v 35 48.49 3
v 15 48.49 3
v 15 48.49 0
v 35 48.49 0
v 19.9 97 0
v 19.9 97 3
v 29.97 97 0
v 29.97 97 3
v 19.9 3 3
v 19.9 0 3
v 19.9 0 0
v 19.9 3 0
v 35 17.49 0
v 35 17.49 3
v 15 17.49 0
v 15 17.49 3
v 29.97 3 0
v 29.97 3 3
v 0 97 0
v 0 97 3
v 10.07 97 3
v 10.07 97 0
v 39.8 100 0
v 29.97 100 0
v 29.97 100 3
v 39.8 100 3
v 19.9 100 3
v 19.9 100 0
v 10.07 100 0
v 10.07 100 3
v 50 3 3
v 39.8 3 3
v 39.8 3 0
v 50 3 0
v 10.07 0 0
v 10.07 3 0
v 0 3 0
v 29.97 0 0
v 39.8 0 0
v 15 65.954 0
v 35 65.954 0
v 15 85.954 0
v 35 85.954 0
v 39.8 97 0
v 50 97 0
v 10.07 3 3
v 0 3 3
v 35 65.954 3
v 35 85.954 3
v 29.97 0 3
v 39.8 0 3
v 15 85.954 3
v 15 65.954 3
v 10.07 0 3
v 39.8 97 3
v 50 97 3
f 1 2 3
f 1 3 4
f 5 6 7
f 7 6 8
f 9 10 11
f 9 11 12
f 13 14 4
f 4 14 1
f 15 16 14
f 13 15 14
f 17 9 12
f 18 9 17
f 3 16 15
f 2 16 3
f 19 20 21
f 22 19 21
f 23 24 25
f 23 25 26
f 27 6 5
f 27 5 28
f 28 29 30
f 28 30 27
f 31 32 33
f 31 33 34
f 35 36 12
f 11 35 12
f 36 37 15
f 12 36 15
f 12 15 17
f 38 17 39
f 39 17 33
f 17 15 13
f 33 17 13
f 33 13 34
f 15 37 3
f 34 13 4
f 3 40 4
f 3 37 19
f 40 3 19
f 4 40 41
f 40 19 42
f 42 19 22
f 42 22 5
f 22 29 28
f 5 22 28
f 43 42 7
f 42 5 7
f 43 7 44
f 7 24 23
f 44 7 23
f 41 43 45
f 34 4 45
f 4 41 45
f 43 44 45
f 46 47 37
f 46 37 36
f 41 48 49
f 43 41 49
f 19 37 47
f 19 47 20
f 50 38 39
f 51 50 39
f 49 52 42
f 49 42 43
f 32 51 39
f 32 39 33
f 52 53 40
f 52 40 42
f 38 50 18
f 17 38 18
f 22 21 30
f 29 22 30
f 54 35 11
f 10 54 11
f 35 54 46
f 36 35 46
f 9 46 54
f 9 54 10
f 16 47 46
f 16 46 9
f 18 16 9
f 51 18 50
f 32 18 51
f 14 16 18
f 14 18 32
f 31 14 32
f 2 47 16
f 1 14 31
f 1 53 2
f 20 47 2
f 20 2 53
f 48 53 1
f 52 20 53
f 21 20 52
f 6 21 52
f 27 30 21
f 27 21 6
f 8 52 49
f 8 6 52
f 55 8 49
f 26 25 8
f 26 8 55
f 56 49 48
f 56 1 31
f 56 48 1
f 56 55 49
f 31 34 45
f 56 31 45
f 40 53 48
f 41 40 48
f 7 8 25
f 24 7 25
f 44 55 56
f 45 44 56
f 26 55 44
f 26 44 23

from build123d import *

# Parameters (mm, degrees)
ESQUISSE1_W             = 50
ESQUISSE1_H             = 100
BOSS_EXTRU_1_DEPTH      = 3
ESQUISSE3_W             = 20
ESQUISSE3_H             = 20
ESQUISSE3_H_2           = 31
ENL_V_MAT_EXTRU_2_DEPTH = 3
ESQUISSE5_W             = 10.07
ESQUISSE5_H             = 3
ENL_V_MAT_EXTRU_3_DEPTH = 3
ESQUISSE6_W             = 0.13
ESQUISSE6_H             = 3
ENL_V_MAT_EXTRU_4_DEPTH = 3


with BuildPart() as part:
    # Esquisse1 → Boss.-Extru.1 (new body)
    with BuildSketch(Plane.XY):
        with Locations((25, 50)):
            Rectangle(ESQUISSE1_W, ESQUISSE1_H)
    extrude(amount=BOSS_EXTRU_1_DEPTH)

    # Esquisse3 → Enlèv. mat.-Extru.2 (cut)
    with BuildSketch(Plane.XY.offset(3)):
        with Locations((25, 75.953744756)):
            Rectangle(ESQUISSE3_W, ESQUISSE3_H)
        with Locations((25, 32.989712488)):
            Rectangle(ESQUISSE3_W, ESQUISSE3_H_2)
    extrude(amount=-ENL_V_MAT_EXTRU_2_DEPTH, mode=Mode.SUBTRACT)

    # Esquisse5 → Enlèv. mat.-Extru.3 (cut)
    with BuildSketch(Plane.XY.offset(3)):
        with Locations((24.935, 98.5)):
            Rectangle(ESQUISSE5_W, ESQUISSE5_H)
        with Locations((5.035, 98.5)):
            Rectangle(ESQUISSE5_W, ESQUISSE5_H)
        with Locations((44.835, 98.5)):
            Rectangle(ESQUISSE5_W, ESQUISSE5_H)
        with Locations((24.935, 1.5)):
            Rectangle(ESQUISSE5_W, ESQUISSE5_H)
        with Locations((44.835, 1.5)):
            Rectangle(ESQUISSE5_W, ESQUISSE5_H)
        with Locations((5.035, 1.5)):
            Rectangle(ESQUISSE5_W, ESQUISSE5_H)
    extrude(amount=-ENL_V_MAT_EXTRU_3_DEPTH, mode=Mode.SUBTRACT)

    # Esquisse6 → Enlèv. mat.-Extru.4 (cut)
    with BuildSketch(Plane.XY.offset(3)):
        with Locations((49.935, 98.5)):
            Rectangle(ESQUISSE6_W, ESQUISSE6_H)
        with Locations((49.935, 1.5)):
            Rectangle(ESQUISSE6_W, ESQUISSE6_H)
    extrude(amount=-ENL_V_MAT_EXTRU_4_DEPTH, mode=Mode.SUBTRACT)


solid = part.part
